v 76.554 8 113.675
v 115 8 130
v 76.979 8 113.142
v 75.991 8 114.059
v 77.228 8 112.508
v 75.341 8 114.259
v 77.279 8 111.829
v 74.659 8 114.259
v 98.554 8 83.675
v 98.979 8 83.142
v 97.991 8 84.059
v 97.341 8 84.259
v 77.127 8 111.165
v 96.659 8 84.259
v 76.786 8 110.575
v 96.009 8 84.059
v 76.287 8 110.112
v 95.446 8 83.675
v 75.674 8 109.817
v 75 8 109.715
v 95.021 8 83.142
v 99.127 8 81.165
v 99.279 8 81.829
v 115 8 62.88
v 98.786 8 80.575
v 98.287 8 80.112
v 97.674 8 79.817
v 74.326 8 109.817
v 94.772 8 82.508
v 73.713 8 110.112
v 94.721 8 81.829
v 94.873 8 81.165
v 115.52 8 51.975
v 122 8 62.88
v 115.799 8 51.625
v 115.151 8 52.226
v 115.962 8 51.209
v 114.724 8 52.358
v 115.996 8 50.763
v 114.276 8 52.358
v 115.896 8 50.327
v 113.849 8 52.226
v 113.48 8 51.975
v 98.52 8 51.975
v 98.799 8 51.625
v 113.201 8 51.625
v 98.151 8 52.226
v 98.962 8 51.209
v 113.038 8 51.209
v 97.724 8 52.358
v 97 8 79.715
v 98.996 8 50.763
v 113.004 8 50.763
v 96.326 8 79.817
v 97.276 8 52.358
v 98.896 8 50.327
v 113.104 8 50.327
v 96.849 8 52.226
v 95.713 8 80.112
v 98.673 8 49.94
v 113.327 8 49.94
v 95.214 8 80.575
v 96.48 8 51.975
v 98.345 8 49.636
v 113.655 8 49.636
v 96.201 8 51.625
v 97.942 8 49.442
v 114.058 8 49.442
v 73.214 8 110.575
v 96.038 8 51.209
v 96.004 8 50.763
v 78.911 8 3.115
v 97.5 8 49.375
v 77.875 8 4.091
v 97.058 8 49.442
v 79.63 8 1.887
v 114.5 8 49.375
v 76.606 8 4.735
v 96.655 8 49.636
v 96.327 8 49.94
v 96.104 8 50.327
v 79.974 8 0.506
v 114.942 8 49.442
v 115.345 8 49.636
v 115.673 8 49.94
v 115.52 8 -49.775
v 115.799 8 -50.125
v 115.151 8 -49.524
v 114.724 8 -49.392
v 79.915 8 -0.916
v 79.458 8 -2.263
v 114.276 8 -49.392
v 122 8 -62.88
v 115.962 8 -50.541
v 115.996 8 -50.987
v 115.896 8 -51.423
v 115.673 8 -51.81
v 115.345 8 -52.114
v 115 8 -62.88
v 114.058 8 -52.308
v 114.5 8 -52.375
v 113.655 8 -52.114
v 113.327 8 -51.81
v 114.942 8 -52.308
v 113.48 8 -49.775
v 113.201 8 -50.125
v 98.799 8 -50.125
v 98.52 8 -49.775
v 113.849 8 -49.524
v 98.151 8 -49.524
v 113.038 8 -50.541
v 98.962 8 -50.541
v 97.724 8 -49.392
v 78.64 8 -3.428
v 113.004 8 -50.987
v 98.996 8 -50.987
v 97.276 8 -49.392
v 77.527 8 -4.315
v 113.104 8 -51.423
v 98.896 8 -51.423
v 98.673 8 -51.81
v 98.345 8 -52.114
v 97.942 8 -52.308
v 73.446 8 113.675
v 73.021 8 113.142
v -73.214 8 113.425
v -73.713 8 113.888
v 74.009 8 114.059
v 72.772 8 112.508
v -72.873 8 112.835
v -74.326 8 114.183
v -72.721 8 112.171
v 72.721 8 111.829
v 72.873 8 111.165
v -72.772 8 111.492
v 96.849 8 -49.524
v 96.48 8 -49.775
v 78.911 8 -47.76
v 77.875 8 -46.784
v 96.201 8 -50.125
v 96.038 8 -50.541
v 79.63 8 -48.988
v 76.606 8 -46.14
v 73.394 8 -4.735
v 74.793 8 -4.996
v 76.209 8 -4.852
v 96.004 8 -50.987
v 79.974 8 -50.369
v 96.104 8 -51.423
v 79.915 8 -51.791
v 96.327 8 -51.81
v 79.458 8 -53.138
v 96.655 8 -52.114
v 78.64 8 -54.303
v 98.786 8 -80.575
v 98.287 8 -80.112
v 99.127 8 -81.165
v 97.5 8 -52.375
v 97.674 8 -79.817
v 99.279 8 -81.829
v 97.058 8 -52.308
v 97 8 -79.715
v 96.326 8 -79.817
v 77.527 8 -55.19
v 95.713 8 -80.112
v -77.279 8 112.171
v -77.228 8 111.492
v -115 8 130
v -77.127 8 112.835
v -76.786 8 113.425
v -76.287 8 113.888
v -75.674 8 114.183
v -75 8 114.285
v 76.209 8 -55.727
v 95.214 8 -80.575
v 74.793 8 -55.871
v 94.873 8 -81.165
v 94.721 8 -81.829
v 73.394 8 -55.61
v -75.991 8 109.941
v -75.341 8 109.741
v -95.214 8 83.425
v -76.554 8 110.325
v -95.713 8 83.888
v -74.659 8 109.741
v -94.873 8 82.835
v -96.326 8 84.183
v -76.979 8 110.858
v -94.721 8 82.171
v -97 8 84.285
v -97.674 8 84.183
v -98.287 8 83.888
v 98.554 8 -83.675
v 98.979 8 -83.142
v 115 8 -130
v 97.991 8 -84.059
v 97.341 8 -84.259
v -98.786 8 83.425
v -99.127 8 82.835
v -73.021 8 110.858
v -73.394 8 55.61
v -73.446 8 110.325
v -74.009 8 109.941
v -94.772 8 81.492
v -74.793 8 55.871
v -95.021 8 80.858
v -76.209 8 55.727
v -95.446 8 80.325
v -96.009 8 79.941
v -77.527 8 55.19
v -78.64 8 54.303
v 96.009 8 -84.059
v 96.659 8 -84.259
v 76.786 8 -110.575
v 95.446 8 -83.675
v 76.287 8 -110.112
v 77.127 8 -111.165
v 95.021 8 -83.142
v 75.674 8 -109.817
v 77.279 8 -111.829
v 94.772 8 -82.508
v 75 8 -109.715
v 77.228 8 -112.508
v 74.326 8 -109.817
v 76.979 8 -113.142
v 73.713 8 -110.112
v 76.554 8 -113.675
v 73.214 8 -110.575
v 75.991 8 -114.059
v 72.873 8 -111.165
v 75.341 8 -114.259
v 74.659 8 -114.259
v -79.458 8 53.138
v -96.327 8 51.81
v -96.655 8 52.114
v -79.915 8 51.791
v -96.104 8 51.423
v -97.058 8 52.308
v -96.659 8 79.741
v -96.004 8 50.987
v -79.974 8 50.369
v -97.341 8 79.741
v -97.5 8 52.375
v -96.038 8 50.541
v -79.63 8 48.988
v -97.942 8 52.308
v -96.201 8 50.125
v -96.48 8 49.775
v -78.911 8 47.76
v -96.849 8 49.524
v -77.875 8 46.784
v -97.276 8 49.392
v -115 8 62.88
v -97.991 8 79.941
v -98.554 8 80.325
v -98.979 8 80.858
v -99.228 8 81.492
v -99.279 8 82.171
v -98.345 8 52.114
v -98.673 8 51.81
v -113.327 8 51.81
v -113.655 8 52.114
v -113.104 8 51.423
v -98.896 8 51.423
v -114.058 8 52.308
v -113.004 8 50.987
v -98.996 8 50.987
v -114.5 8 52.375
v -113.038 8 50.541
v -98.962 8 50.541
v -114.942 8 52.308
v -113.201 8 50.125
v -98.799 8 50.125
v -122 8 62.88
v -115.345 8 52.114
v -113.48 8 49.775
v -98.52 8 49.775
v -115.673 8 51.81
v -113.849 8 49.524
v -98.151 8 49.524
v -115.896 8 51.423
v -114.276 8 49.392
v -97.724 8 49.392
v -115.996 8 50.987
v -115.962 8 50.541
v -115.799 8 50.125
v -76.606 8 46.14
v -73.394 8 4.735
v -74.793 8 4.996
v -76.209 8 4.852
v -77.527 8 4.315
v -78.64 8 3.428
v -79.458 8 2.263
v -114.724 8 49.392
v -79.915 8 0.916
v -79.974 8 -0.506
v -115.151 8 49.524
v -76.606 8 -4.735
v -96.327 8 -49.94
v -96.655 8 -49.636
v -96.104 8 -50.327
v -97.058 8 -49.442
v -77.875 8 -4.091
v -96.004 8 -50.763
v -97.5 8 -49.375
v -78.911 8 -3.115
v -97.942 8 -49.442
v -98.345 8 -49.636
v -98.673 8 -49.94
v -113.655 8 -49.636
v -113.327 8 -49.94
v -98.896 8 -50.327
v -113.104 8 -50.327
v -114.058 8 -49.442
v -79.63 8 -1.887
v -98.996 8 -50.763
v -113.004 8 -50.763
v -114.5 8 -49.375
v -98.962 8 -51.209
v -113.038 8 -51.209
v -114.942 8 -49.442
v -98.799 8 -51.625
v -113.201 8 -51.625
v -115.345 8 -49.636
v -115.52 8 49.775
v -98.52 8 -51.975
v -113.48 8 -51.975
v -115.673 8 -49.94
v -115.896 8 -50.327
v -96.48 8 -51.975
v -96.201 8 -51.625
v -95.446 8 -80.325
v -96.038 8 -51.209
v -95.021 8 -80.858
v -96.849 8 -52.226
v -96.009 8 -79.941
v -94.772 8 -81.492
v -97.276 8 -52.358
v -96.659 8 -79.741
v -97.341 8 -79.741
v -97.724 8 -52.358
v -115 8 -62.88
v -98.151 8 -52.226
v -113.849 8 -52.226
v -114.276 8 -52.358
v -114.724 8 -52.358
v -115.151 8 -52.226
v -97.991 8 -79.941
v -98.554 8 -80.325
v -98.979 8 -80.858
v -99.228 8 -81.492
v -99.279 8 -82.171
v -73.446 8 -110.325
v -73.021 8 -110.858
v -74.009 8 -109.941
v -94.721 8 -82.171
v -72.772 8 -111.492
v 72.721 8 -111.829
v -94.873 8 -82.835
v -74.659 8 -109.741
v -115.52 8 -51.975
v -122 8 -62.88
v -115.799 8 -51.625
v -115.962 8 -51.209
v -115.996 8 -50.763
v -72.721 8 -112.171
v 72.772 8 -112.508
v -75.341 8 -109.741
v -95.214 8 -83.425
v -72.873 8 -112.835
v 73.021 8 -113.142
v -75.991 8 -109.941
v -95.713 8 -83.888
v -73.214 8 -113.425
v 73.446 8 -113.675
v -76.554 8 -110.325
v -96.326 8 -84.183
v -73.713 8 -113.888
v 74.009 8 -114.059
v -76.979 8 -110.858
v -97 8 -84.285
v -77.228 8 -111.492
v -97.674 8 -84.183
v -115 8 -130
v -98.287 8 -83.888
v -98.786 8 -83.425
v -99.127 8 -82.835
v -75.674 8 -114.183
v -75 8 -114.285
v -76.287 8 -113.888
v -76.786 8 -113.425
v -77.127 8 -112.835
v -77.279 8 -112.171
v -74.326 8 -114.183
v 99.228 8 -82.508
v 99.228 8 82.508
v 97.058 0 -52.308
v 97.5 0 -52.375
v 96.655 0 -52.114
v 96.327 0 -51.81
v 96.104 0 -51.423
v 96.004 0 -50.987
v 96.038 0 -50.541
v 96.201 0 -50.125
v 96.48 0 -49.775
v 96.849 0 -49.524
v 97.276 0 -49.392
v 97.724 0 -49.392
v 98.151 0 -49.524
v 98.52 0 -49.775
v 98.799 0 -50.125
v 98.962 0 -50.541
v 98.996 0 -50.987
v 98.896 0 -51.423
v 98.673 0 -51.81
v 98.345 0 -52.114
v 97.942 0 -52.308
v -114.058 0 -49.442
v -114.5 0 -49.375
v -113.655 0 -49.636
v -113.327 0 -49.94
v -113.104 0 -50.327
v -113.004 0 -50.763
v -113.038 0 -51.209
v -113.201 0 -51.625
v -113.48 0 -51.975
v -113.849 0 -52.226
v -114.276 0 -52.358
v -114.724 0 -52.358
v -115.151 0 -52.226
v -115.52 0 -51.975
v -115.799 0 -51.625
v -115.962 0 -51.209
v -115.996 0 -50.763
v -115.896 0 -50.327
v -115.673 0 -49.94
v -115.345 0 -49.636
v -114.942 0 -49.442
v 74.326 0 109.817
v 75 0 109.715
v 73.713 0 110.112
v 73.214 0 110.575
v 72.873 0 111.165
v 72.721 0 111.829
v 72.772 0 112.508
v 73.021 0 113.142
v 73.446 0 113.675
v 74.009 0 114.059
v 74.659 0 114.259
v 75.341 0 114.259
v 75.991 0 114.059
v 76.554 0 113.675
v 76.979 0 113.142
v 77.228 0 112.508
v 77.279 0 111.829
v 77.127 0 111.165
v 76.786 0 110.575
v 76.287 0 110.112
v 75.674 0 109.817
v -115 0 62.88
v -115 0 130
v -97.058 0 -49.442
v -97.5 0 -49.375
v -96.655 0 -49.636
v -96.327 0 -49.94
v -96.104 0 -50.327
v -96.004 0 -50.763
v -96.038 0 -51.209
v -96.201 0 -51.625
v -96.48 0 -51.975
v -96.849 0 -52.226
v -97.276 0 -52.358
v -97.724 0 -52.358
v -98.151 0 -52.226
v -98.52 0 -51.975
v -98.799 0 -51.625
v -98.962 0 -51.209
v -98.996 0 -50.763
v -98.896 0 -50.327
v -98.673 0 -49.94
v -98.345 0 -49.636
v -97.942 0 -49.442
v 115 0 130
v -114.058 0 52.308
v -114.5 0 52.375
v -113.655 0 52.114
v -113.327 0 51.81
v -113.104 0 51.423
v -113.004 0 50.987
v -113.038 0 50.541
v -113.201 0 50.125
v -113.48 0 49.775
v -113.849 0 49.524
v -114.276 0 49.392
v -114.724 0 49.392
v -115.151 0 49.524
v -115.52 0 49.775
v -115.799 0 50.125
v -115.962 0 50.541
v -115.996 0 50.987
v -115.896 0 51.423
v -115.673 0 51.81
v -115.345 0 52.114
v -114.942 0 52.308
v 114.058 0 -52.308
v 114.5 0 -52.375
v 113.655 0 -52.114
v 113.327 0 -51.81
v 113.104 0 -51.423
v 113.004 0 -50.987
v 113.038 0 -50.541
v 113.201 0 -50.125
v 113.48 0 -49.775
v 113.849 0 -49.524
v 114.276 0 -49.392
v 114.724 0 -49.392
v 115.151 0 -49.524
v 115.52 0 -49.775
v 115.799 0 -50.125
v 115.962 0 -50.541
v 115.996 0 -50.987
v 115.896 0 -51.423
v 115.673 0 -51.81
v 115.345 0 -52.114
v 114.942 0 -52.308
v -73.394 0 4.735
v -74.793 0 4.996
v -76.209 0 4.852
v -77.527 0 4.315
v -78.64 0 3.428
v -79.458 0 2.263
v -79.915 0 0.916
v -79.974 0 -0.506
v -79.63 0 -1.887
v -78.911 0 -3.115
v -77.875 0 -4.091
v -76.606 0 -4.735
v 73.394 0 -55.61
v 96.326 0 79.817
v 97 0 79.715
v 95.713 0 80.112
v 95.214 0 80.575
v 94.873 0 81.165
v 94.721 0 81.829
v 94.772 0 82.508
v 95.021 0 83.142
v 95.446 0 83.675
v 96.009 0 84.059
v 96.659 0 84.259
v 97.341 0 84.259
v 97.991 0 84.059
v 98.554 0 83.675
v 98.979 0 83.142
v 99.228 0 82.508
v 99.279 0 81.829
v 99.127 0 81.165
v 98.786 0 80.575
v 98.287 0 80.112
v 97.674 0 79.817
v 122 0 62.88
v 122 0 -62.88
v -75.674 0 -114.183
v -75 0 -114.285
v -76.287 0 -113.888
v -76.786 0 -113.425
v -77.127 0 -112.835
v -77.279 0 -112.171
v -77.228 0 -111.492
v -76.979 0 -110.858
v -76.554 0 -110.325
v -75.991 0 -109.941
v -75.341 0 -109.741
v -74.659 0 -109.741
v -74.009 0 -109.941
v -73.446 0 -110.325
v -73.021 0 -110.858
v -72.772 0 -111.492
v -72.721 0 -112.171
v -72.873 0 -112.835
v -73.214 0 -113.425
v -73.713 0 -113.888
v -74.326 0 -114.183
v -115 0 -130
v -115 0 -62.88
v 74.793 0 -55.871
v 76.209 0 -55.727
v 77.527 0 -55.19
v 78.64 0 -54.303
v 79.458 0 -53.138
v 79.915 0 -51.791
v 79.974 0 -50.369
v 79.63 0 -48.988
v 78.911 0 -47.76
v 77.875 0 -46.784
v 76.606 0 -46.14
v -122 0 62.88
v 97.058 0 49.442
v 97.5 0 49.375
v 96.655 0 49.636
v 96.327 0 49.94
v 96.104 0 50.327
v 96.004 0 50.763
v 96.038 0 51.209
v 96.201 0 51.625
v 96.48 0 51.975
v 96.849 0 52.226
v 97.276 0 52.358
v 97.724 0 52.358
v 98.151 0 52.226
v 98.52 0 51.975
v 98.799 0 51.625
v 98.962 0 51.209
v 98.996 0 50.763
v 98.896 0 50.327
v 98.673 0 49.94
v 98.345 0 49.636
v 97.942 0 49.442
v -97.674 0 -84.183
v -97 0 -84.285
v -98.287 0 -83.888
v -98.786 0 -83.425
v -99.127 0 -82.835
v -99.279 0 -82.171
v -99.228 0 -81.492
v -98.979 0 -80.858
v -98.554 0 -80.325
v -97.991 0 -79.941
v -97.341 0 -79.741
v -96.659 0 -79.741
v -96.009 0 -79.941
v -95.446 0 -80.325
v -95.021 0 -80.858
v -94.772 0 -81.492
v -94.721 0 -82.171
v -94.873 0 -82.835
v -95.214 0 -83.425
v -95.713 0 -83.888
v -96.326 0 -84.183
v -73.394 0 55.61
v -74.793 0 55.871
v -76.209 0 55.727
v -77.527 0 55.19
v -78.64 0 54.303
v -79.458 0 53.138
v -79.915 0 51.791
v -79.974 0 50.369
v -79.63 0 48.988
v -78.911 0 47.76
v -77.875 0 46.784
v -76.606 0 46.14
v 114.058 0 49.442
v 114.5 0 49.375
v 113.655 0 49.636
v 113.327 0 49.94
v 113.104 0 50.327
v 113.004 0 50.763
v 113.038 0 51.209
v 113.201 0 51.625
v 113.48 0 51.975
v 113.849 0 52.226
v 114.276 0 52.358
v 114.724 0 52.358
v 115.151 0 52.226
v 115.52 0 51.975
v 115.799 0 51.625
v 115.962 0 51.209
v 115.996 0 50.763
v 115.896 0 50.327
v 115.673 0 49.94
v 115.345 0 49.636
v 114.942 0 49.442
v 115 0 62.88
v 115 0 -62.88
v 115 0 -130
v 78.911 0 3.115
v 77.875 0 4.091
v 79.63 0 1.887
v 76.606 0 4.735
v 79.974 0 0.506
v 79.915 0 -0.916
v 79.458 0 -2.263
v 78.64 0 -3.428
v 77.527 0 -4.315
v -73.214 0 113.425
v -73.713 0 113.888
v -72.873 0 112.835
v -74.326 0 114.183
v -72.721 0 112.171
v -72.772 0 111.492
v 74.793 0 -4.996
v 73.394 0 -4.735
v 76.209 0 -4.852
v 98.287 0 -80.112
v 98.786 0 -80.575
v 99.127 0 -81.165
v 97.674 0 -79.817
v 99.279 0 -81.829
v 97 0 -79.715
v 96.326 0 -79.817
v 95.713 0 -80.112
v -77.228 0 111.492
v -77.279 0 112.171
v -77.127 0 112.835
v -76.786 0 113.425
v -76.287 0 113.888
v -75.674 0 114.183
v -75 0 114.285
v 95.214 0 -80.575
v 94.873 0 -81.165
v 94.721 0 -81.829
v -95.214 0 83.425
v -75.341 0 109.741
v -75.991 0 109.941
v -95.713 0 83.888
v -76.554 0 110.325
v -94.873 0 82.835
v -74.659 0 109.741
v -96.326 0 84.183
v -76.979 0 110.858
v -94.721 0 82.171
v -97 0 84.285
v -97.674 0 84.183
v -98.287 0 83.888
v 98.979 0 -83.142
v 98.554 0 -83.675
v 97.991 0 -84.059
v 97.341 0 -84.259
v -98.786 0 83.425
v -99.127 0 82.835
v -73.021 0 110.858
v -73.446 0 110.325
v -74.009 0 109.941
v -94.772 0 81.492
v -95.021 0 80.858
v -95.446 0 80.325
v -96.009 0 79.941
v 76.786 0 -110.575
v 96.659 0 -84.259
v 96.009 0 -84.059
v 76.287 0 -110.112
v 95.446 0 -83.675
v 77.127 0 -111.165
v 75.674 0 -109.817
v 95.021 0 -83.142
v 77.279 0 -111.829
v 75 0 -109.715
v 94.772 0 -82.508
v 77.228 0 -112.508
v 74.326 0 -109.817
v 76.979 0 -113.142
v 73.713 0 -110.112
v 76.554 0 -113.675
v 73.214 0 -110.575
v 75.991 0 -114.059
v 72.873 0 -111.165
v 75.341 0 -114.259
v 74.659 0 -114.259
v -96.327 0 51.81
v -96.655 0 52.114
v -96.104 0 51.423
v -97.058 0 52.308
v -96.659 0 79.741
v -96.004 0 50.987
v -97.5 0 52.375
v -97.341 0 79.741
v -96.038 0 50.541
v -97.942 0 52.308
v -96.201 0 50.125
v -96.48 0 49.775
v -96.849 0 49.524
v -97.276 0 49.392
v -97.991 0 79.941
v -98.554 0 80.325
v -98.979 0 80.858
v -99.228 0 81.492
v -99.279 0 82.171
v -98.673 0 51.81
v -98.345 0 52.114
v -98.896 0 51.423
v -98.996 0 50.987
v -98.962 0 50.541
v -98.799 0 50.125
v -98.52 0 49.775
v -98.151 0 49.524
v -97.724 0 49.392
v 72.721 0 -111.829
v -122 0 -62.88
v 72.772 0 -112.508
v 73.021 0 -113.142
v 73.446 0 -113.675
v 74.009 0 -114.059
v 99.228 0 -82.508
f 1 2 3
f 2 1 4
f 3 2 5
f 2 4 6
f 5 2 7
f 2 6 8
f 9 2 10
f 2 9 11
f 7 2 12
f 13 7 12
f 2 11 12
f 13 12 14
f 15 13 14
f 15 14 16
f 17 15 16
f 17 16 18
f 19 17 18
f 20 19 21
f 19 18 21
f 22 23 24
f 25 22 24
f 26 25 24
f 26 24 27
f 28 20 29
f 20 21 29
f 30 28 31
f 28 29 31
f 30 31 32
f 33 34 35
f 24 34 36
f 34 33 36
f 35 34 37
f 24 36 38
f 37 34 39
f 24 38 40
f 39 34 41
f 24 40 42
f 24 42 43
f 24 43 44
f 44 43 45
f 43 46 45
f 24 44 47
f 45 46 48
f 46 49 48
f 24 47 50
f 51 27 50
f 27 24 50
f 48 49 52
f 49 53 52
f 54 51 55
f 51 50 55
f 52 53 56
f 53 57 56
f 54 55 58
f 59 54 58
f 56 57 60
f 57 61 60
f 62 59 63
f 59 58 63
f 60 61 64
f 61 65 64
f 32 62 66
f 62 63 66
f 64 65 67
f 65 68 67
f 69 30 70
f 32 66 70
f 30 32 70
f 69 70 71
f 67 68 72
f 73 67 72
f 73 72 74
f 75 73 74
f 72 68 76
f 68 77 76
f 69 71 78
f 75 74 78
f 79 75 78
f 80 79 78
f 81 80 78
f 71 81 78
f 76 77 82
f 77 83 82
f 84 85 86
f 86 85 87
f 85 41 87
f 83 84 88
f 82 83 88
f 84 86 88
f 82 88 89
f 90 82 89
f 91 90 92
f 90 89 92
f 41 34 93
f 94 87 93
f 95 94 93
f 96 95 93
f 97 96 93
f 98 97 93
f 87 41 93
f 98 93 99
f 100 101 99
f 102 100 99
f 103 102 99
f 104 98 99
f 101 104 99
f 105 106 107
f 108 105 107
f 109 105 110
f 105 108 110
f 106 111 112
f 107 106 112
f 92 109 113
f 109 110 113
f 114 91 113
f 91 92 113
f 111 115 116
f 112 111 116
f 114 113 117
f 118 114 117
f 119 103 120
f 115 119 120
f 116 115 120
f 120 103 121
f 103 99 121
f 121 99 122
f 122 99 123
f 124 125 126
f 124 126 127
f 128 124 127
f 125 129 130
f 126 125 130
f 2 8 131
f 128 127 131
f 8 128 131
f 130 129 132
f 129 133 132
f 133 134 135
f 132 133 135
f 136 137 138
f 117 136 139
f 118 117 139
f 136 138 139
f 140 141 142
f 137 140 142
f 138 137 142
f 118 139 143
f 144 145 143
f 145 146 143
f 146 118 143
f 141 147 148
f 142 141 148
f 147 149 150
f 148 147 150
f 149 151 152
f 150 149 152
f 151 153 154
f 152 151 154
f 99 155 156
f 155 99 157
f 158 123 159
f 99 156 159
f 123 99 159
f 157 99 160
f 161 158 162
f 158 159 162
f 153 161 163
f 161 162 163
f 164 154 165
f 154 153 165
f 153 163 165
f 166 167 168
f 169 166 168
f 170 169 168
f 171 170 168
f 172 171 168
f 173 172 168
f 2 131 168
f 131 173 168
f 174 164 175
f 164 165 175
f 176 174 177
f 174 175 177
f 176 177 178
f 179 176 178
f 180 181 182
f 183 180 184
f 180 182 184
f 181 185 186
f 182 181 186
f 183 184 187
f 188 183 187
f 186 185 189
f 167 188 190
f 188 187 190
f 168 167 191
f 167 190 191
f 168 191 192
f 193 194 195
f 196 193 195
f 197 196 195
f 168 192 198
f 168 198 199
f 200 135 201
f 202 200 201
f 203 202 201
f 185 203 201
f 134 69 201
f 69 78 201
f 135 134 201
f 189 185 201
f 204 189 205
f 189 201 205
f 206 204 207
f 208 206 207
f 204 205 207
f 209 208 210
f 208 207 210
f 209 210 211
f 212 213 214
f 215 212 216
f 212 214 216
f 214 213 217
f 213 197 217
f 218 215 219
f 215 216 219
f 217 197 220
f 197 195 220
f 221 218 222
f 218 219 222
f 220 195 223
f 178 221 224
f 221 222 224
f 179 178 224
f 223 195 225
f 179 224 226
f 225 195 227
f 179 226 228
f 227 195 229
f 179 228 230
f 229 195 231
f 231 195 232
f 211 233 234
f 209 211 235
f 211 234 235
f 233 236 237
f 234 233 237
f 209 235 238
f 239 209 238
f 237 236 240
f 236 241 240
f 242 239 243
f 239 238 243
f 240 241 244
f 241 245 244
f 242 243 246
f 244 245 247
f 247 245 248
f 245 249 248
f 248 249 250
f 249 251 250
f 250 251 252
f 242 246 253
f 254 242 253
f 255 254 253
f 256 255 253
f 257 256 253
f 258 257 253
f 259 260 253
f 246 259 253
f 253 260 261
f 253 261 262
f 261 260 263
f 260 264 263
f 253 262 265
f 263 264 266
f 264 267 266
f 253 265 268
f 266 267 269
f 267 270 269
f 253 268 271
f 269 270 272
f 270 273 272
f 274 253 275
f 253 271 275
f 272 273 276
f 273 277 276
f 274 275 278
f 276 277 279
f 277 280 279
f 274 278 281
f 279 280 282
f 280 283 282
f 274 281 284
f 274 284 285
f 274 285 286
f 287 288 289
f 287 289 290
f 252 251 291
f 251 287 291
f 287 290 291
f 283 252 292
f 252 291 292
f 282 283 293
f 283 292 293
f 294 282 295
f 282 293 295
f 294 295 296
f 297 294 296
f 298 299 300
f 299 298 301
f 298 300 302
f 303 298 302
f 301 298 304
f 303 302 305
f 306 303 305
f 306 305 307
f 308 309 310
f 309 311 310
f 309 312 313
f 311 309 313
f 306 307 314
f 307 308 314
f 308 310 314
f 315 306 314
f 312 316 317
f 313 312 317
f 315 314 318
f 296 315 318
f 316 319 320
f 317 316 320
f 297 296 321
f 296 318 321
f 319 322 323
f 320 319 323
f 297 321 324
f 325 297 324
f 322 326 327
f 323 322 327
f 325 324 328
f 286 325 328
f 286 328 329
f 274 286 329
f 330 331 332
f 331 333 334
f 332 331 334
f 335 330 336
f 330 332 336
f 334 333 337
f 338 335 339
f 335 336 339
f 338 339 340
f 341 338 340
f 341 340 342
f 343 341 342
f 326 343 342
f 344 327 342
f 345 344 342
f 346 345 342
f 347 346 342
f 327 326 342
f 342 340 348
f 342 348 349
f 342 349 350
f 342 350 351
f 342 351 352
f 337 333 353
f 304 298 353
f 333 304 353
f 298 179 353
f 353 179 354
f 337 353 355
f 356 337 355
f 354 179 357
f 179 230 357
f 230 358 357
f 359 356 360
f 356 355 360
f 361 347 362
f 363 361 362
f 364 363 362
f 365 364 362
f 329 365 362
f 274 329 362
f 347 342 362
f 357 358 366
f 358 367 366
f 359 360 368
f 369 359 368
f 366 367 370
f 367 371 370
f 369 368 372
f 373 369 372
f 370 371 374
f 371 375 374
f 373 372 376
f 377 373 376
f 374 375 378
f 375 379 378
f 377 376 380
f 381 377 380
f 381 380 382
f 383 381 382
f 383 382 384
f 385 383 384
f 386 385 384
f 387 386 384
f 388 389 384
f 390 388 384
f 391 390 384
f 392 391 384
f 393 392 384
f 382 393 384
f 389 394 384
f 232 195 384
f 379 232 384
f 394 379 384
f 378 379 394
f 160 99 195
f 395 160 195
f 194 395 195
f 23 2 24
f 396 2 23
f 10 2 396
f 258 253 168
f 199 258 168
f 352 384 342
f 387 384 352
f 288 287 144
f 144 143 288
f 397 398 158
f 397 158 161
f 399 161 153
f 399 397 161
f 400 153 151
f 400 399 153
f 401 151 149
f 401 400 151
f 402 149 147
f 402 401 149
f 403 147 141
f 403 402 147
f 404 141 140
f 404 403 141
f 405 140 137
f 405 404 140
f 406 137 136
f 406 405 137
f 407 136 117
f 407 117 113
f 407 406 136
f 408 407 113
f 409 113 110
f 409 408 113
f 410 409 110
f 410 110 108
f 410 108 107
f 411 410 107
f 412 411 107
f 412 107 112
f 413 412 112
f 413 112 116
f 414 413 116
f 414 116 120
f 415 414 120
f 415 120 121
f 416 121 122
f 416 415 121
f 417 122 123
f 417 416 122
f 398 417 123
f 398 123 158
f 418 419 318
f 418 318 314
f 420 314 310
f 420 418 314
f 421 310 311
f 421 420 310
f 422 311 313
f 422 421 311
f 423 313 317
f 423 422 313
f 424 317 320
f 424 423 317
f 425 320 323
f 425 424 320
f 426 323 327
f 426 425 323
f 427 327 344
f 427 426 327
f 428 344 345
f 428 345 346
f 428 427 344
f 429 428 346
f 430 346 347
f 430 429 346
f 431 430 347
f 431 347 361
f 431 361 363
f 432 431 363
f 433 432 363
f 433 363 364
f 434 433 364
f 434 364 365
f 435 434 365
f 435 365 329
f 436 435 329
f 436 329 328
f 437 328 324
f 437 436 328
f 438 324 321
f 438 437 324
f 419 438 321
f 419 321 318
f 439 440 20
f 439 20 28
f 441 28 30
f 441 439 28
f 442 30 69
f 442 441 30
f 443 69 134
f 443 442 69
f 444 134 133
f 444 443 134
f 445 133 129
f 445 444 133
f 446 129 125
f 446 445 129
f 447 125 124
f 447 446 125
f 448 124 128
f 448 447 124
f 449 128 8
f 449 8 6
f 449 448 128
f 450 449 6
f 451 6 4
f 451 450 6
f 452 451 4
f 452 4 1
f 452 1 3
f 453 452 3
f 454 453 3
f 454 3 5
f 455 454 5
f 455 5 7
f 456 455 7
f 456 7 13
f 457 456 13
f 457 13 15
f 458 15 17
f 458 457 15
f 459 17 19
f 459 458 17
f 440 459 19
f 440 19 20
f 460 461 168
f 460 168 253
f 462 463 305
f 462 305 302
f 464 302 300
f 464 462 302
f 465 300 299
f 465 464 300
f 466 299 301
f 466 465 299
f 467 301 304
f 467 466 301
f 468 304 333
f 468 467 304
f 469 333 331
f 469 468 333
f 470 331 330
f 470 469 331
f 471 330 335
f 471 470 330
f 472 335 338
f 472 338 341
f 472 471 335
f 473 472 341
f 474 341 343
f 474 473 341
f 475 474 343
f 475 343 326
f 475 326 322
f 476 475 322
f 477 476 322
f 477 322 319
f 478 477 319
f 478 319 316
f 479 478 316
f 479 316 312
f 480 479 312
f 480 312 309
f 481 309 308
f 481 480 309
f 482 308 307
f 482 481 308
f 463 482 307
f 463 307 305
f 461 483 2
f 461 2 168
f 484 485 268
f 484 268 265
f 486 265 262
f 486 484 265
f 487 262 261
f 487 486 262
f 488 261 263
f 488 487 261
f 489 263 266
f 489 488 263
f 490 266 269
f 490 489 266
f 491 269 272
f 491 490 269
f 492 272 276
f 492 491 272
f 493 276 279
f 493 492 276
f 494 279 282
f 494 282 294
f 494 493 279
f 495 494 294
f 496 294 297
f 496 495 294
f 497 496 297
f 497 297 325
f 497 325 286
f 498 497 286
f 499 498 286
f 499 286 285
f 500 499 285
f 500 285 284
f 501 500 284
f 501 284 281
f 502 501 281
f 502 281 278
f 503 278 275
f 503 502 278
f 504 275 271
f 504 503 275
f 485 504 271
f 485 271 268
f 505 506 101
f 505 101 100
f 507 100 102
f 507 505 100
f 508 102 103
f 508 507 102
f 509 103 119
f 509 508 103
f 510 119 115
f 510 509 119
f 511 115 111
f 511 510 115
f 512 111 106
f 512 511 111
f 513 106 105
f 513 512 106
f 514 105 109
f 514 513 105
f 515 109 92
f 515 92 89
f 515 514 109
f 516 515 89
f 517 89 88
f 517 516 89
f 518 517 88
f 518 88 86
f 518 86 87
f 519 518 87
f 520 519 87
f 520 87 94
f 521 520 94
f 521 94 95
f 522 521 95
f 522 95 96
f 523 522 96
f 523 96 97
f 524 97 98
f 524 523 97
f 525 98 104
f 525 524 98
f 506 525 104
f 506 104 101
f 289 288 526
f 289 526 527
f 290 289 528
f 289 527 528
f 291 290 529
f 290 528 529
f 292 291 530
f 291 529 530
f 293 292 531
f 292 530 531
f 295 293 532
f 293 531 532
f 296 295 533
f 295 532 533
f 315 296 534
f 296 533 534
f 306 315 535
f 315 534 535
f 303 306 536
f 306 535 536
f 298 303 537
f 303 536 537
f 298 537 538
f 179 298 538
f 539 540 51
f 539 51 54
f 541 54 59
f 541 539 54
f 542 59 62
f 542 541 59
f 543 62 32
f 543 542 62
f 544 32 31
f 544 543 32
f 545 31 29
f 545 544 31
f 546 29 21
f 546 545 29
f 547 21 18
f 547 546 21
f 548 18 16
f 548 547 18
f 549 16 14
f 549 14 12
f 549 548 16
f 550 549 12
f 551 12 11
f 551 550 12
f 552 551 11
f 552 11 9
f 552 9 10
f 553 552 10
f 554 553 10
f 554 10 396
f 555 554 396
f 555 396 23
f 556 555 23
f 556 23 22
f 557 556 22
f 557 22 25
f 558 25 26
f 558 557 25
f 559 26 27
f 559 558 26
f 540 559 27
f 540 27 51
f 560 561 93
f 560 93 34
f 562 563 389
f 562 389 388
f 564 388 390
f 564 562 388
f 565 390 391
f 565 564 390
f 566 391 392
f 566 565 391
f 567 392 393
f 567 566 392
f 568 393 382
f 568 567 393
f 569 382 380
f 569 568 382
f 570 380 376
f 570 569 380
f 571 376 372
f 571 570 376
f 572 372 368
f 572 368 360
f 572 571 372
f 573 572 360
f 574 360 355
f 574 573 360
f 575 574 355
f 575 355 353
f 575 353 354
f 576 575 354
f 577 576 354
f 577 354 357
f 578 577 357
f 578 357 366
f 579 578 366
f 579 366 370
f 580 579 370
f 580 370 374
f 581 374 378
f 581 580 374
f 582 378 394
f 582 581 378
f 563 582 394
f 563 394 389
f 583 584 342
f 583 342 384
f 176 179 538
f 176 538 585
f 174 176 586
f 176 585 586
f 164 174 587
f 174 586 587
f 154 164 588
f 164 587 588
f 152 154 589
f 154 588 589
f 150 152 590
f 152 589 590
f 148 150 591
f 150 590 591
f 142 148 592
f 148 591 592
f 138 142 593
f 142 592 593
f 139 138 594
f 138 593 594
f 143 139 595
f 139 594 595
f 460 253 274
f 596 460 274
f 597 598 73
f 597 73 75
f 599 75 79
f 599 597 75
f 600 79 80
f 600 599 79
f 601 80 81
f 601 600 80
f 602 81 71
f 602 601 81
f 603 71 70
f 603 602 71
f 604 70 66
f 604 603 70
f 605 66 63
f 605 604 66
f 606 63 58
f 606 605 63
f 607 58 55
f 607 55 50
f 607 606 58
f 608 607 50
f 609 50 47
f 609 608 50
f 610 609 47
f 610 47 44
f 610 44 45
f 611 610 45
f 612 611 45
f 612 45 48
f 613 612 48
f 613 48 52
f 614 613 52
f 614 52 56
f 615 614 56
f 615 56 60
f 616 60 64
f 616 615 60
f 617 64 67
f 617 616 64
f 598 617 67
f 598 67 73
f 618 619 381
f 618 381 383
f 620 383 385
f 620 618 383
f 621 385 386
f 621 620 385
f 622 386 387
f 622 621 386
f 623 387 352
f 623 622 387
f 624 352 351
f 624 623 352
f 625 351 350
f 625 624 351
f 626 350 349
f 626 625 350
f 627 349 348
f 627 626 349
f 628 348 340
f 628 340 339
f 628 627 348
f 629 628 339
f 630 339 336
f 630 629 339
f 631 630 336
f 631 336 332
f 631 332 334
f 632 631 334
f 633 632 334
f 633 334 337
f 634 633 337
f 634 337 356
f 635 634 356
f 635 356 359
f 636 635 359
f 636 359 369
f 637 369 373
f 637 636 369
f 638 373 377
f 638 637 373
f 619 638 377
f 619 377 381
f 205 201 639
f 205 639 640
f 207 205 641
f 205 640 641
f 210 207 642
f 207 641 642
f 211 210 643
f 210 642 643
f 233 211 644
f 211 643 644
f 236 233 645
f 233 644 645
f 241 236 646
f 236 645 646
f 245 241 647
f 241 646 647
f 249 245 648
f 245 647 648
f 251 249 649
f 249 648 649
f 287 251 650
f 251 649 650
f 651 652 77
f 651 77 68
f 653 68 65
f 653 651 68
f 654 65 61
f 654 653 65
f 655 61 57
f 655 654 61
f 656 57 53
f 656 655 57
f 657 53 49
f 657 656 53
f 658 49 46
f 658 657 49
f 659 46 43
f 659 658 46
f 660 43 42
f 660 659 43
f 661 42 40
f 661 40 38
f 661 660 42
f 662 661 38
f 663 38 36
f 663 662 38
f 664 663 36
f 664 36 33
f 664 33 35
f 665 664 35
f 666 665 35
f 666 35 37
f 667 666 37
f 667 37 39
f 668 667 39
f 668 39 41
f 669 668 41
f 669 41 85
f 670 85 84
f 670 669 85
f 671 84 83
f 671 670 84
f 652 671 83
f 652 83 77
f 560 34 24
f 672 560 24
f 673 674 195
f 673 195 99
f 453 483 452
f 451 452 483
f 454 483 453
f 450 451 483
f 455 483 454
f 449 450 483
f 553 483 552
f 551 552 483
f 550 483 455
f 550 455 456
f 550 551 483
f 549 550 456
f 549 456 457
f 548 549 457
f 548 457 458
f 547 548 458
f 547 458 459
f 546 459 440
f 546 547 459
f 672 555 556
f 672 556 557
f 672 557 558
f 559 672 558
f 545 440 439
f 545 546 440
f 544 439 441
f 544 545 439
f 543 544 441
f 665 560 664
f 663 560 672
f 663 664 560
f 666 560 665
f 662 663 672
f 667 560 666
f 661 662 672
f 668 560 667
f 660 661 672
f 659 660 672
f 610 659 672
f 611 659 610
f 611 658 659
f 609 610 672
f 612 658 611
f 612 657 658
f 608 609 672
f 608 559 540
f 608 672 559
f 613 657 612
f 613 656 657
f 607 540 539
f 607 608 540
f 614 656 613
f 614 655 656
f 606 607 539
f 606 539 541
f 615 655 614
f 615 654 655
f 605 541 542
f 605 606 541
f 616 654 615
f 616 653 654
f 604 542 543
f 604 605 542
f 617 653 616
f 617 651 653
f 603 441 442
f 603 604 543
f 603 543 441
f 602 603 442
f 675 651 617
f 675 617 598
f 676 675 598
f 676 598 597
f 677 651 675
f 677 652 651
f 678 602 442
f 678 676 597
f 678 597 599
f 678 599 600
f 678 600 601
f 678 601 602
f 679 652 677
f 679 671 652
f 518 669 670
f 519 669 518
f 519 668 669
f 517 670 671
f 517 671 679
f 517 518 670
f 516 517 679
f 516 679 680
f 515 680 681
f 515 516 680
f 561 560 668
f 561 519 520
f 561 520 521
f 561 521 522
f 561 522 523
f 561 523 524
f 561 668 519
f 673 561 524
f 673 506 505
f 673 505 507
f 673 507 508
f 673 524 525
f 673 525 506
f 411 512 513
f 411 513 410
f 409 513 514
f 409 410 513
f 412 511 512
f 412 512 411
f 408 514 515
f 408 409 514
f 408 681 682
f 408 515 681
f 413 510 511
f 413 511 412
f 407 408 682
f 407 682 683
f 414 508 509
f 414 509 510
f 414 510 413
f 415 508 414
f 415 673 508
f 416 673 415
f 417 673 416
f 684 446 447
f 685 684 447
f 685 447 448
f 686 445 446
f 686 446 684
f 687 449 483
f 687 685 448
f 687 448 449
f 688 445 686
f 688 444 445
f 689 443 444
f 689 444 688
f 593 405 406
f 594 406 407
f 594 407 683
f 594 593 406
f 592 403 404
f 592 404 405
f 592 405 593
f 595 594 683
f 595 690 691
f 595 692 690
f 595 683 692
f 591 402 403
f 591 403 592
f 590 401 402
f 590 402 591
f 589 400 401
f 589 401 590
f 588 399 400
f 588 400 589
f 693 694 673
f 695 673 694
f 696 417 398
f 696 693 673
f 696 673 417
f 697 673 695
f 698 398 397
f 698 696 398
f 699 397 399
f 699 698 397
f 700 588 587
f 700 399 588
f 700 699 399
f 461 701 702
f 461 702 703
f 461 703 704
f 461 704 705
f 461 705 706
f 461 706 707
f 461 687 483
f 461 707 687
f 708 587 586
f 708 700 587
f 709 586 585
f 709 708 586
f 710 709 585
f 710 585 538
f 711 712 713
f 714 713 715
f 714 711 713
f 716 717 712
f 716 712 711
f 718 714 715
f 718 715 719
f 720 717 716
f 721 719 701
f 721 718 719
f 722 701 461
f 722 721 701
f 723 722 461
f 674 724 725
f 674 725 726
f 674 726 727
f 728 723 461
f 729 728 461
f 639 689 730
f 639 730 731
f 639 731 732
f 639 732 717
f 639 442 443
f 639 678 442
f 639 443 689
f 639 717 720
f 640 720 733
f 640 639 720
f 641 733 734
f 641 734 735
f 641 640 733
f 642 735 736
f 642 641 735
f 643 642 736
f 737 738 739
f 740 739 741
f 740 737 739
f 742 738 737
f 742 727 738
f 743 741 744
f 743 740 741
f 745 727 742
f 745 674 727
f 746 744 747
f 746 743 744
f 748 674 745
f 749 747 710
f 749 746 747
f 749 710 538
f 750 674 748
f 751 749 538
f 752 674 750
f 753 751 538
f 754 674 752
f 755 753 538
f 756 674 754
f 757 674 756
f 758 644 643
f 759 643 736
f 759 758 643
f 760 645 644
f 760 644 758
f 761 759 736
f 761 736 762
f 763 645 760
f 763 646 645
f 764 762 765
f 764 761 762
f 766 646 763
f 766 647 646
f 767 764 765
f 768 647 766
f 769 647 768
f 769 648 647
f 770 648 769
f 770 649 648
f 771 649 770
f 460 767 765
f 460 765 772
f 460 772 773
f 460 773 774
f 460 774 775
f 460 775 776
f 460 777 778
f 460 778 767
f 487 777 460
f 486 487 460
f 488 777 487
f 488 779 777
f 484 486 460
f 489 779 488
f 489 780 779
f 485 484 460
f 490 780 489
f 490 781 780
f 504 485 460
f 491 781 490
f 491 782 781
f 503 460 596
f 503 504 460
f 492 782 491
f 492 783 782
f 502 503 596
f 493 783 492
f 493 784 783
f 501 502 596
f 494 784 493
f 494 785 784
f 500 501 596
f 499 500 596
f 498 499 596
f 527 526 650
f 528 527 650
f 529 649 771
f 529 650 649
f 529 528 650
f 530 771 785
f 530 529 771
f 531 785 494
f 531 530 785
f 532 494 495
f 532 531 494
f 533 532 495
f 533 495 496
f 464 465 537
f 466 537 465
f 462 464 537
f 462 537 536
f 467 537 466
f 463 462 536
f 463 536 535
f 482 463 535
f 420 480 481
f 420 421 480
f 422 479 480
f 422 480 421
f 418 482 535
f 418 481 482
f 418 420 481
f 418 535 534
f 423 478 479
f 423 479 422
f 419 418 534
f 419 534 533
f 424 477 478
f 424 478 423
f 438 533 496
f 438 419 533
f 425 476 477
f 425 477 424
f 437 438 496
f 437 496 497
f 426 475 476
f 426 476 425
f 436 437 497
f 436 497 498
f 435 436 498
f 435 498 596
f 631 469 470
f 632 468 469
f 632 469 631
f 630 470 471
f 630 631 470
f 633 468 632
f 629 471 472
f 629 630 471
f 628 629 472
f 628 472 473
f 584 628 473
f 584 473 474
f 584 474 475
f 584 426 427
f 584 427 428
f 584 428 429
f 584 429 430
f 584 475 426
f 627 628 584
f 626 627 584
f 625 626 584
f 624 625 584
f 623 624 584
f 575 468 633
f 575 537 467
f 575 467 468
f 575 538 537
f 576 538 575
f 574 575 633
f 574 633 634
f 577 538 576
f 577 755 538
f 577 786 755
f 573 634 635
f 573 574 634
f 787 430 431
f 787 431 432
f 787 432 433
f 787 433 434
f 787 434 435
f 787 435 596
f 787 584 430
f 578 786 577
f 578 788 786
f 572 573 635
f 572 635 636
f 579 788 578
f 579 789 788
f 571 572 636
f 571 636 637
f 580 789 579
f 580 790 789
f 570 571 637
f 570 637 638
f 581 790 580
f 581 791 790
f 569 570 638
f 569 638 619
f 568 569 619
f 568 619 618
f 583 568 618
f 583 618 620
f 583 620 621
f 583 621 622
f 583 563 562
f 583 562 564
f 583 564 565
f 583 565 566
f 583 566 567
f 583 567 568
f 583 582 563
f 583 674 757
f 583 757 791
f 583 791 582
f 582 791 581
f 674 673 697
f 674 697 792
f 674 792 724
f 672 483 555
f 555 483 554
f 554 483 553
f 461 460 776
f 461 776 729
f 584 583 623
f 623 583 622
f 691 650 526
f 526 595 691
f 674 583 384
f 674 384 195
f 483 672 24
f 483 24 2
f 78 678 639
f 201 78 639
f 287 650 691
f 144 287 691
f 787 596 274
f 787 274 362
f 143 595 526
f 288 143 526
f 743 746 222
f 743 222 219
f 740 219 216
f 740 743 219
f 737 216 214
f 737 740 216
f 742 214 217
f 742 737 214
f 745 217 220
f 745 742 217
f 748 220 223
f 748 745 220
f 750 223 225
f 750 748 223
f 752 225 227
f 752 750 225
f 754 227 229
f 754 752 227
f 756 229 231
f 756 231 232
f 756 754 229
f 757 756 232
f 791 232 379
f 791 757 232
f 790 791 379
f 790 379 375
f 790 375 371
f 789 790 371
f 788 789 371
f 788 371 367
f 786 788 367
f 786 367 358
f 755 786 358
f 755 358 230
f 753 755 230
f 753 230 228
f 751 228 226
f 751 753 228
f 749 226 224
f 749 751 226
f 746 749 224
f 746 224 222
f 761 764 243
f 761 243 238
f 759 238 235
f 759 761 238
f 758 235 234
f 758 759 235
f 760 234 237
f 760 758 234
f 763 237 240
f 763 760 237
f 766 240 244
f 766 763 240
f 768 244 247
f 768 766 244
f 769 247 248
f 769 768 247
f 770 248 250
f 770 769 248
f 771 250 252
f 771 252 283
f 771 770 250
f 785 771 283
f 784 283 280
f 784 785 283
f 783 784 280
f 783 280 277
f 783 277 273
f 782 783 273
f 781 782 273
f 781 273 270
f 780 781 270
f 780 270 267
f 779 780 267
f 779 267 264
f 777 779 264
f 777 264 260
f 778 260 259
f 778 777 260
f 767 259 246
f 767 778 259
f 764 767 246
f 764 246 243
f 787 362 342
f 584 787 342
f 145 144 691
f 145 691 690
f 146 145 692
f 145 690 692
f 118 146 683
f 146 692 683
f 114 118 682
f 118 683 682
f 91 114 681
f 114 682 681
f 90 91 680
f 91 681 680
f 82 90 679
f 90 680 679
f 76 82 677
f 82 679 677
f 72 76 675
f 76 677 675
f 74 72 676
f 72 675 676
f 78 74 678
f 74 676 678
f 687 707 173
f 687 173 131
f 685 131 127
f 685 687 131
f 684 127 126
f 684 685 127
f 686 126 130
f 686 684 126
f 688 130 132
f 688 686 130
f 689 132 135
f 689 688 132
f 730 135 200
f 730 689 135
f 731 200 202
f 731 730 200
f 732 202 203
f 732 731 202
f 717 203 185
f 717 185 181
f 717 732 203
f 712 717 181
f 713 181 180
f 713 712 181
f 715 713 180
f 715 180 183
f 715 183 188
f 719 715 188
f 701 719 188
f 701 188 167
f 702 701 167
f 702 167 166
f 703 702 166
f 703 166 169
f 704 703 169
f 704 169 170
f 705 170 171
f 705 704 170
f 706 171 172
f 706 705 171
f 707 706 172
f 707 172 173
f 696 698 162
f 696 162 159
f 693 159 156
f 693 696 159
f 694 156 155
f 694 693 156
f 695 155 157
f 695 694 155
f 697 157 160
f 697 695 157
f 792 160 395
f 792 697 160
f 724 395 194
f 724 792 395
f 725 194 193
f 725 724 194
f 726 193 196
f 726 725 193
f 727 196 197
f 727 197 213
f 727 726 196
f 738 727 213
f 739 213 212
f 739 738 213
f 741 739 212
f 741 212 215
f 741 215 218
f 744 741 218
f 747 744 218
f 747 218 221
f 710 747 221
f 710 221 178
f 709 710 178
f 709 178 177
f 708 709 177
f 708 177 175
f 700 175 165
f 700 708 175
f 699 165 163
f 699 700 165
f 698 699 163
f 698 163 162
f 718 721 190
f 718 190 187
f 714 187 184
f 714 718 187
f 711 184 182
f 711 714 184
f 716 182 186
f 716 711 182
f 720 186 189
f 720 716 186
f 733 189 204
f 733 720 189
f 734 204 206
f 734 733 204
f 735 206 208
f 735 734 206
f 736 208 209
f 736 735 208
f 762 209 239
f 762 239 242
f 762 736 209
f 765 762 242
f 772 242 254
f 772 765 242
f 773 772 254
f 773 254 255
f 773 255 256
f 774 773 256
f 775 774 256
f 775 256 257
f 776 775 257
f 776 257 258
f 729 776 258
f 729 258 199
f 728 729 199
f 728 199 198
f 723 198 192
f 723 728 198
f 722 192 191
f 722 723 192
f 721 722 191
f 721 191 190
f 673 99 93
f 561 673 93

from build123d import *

# Parameters (mm, degrees)
SKETCH1_R           = 2.285
SKETCH1_R_2         = 1.5
BOSS_EXTRUDE1_DEPTH = 8


with BuildPart() as part:
    # Sketch1 → Boss-Extrude1 (new body)
    with BuildSketch(Plane(origin=(0, 0, 0), x_dir=(1, 0, 0), z_dir=(0, 1, 0))):
        Polygon((-115, 130), (115, 130), (115, 62.88), (122, 62.88), (122, -62.88), (115, -62.88), (115, -130), (-115, -130), (-115, -62.88), (-122, -62.88), (-122, 62.88), (-115, 62.88), align=None)
        with Locations(Location((-75, -112, 0), (0, 0, 270))):
            Circle(SKETCH1_R, mode=Mode.SUBTRACT)
        with Locations(Location((-97, -82, 0), (0, 0, 270))):
            Circle(SKETCH1_R, mode=Mode.SUBTRACT)
        with Locations(Location((97, -82, 0), (0, 0, 90))):
            Circle(SKETCH1_R, mode=Mode.SUBTRACT)
        with Locations(Location((75, -112, 0), (0, 0, 90))):
            Circle(SKETCH1_R, mode=Mode.SUBTRACT)
        with Locations(Location((75, 112, 0), (0, 0, 270))):
            Circle(SKETCH1_R, mode=Mode.SUBTRACT)
        with Locations(Location((97, 82, 0), (0, 0, 270))):
            Circle(SKETCH1_R, mode=Mode.SUBTRACT)
        with Locations(Location((-97, 82, 0), (0, 0, 90))):
            Circle(SKETCH1_R, mode=Mode.SUBTRACT)
        with Locations(Location((-75, 112, 0), (0, 0, 90))):
            Circle(SKETCH1_R, mode=Mode.SUBTRACT)
        with Locations(Location((-114.5, 50.875, 0), (0, 0, 270))):
            Circle(SKETCH1_R_2, mode=Mode.SUBTRACT)
        with Locations(Location((-97.5, 50.875, 0), (0, 0, 270))):
            Circle(SKETCH1_R_2, mode=Mode.SUBTRACT)
        with Locations(Location((-114.5, -50.875, 0), (0, 0, 270))):
            Circle(SKETCH1_R_2, mode=Mode.SUBTRACT)
        with Locations(Location((-97.5, -50.875, 0), (0, 0, 270))):
            Circle(SKETCH1_R_2, mode=Mode.SUBTRACT)
        with Locations(Location((97.5, -50.875, 0), (0, 0, 90))):
            Circle(SKETCH1_R_2, mode=Mode.SUBTRACT)
        with Locations(Location((114.5, -50.875, 0), (0, 0, 90))):
            Circle(SKETCH1_R_2, mode=Mode.SUBTRACT)
        with Locations(Location((97.5, 50.875, 0), (0, 0, 90))):
            Circle(SKETCH1_R_2, mode=Mode.SUBTRACT)
        with Locations(Location((114.5, 50.875, 0), (0, 0, 90))):
            Circle(SKETCH1_R_2, mode=Mode.SUBTRACT)
        with BuildLine():
            Line((-76.605976208, 4.735064986), (73.394023792, 55.610064986))
            ThreePointArc((73.394023792, 55.610064986), (79.735064986, 52.480976208), (76.605976208, 46.139935014))
            Line((76.605976208, 46.139935014), (-73.394023792, -4.735064986))
            ThreePointArc((-73.394023792, -4.735064986), (-79.735064986, -1.605976208), (-76.605976208, 4.735064986))
        make_face(mode=Mode.SUBTRACT)
        with BuildLine():
            Line((-76.605976208, -46.139935014), (73.394023792, 4.735064986))
            ThreePointArc((73.394023792, 4.735064986), (79.735064986, 1.605976208), (76.605976208, -4.735064986))
            Line((76.605976208, -4.735064986), (-73.394023792, -55.610064986))
            ThreePointArc((-73.394023792, -55.610064986), (-79.735064986, -52.480976208), (-76.605976208, -46.139935014))
        make_face(mode=Mode.SUBTRACT)
    extrude(amount=BOSS_EXTRUDE1_DEPTH)


solid = part.part
